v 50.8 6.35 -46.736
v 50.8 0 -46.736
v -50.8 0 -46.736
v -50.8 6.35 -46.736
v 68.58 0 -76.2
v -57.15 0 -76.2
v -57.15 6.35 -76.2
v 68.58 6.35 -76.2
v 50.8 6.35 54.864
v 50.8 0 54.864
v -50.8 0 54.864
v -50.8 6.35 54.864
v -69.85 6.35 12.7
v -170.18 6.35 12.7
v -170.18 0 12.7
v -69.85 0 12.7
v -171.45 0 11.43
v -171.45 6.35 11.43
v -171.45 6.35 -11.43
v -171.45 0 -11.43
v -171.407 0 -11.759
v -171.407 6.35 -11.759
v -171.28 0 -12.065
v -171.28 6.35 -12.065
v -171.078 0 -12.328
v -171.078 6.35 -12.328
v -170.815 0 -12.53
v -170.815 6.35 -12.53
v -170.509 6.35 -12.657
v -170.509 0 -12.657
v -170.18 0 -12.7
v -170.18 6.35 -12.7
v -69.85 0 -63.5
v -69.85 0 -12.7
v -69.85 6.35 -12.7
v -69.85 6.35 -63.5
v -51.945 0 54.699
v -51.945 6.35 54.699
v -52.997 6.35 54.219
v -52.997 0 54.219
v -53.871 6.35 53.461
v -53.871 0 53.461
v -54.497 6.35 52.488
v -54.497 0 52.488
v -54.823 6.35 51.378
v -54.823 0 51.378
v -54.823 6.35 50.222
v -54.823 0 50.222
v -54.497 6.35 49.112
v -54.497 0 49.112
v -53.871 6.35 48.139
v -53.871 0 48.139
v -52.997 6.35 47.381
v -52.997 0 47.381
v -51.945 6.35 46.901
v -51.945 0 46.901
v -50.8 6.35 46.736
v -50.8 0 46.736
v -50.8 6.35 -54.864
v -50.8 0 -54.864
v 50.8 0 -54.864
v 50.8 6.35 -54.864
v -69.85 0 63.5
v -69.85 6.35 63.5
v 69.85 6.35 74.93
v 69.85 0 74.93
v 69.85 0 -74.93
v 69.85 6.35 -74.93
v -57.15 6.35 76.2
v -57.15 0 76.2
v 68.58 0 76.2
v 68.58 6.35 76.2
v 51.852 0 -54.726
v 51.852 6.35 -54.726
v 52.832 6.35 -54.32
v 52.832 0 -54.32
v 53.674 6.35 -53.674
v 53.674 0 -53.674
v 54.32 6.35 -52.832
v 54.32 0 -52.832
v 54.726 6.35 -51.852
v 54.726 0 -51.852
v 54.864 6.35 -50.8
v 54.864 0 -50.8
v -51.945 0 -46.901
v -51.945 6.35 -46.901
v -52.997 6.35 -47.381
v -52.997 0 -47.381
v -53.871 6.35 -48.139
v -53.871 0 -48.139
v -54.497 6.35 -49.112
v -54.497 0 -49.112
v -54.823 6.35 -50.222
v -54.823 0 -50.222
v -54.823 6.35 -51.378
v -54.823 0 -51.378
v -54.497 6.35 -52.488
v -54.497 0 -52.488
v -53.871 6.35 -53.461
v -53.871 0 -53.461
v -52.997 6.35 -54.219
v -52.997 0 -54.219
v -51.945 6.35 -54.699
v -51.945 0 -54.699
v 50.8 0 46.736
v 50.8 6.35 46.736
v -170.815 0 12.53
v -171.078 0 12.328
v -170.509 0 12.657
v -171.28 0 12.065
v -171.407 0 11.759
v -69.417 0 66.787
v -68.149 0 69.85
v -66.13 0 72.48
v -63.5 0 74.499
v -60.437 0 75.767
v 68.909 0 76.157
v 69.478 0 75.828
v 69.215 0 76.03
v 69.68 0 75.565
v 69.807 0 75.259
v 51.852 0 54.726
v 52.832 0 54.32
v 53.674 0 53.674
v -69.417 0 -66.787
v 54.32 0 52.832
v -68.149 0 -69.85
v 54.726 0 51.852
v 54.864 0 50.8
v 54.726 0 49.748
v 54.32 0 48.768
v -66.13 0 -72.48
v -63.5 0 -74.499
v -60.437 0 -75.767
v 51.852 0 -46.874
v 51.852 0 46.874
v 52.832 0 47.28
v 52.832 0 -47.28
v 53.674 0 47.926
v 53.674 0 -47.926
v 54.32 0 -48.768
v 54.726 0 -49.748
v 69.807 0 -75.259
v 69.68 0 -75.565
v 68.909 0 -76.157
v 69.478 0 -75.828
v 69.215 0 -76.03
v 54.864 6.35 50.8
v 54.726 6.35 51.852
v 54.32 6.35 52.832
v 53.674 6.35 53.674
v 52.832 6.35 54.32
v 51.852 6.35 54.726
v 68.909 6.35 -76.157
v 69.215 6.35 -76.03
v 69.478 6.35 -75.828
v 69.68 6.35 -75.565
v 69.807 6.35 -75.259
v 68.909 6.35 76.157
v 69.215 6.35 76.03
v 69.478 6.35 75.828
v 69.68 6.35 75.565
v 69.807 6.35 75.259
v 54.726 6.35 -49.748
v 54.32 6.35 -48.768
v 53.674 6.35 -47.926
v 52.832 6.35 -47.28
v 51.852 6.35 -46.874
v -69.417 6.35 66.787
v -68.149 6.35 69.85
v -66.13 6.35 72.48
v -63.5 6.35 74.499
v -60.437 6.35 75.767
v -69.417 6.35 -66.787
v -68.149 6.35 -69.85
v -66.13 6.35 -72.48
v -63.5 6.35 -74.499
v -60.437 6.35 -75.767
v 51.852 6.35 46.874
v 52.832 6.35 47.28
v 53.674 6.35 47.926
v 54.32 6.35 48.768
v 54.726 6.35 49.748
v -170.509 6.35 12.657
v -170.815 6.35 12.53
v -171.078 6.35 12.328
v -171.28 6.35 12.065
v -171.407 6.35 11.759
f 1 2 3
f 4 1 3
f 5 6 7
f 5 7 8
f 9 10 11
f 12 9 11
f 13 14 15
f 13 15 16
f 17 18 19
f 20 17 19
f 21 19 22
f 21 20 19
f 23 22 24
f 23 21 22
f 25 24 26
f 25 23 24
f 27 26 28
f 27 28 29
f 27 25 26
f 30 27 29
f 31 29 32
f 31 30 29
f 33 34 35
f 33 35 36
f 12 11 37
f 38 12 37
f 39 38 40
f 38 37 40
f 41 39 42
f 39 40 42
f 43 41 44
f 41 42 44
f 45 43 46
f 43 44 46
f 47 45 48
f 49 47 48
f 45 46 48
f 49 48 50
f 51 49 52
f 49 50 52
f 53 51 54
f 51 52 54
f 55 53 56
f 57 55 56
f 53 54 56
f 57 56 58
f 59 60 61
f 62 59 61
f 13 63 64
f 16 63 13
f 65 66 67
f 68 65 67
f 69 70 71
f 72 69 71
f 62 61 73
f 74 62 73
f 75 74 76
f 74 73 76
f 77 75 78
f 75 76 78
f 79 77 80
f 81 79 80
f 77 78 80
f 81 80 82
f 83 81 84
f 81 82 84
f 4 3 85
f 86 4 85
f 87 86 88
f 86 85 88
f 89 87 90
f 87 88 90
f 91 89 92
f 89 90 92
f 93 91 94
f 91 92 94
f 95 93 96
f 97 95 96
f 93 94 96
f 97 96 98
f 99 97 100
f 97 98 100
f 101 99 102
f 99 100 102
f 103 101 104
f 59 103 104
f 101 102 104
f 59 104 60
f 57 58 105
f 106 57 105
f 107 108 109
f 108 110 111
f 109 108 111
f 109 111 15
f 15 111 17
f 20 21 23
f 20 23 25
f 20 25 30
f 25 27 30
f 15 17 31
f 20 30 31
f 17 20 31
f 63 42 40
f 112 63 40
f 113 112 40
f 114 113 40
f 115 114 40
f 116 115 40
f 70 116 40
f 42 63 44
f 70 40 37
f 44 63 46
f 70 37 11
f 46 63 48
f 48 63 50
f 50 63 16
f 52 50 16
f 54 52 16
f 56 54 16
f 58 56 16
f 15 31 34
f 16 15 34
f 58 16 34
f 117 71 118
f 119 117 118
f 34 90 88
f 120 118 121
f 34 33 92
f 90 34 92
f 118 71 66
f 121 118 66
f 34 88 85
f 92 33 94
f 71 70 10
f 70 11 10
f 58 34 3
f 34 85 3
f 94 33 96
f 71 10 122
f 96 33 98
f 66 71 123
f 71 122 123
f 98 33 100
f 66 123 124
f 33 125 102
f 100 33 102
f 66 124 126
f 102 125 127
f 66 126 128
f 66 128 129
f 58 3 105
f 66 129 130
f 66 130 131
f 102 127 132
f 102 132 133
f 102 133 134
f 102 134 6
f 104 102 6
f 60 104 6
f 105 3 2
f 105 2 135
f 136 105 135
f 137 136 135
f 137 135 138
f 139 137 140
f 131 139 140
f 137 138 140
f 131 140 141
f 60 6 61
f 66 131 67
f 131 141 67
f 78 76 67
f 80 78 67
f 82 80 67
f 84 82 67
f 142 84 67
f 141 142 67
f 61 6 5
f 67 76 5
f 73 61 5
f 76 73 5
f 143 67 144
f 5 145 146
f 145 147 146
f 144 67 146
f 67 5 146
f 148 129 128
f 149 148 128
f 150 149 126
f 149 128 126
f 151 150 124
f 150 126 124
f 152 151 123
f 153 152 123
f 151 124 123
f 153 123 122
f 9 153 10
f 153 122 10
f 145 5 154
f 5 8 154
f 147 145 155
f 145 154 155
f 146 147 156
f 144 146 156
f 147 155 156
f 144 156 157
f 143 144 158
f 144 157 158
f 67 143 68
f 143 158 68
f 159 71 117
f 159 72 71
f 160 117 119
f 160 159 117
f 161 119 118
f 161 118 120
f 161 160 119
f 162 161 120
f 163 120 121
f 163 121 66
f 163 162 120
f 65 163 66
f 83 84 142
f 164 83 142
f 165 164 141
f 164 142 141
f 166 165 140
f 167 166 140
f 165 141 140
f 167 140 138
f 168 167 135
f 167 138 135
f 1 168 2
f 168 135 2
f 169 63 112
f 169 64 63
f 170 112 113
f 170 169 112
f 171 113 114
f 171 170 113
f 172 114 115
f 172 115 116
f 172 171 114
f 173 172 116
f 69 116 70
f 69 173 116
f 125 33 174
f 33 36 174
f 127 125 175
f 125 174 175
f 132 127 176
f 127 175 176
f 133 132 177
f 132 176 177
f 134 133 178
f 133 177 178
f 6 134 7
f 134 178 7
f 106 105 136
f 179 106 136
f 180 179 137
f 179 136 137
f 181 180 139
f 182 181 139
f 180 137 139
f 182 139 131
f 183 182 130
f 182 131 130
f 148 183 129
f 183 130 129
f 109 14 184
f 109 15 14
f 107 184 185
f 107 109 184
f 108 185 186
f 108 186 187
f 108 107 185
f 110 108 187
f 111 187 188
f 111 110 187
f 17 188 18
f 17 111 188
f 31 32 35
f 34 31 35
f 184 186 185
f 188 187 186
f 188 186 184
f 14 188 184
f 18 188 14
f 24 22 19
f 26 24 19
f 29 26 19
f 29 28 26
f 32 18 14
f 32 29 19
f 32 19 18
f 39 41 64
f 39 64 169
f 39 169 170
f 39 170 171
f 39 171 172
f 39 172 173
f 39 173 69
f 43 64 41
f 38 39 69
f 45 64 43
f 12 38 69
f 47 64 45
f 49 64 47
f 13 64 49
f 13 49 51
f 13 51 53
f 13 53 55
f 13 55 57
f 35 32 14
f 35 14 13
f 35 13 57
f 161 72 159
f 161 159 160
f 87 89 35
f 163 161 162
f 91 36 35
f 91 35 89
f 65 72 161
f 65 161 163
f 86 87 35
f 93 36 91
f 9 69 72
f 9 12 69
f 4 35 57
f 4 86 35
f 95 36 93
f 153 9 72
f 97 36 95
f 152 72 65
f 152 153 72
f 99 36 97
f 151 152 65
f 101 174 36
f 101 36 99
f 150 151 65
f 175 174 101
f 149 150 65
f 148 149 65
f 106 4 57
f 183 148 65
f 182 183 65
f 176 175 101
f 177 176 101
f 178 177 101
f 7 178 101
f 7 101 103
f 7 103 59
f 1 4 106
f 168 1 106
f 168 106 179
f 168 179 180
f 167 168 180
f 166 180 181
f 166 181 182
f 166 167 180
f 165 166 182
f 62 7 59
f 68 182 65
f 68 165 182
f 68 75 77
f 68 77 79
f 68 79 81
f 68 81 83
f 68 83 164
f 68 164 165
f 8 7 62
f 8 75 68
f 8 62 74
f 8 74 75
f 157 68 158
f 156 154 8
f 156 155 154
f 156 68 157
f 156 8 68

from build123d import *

# Parameters (mm, degrees)
SKETCH1_W           = 139.7
SKETCH1_H           = 152.4
BOSS_EXTRUDE1_DEPTH = 6.35
FILLET1_R           = 12.7
SKETCH2_W           = 101.6
SKETCH2_H           = 25.4
BOSS_EXTRUDE2_DEPTH = 6.35
FILLET2_R           = 1.27


with BuildPart() as part:
    # Sketch1 → Boss-Extrude1 (new body)
    with BuildSketch(Plane(origin=(0, 0, 0), x_dir=(1, 0, 0), z_dir=(0, 1, 0))):
        Rectangle(SKETCH1_W, SKETCH1_H)
        with BuildLine():
            ThreePointArc((54.864, -50.8), (53.673681959, -53.673681959), (50.8, -54.864))
            Line((50.8, -54.864), (-50.8, -54.864))
            ThreePointArc((-50.8, -54.864), (-54.864, -50.8), (-50.8, -46.736))
            Line((-50.8, -46.736), (50.8, -46.736))
            ThreePointArc((50.8, -46.736), (53.673681959, -47.926318041), (54.864, -50.8))
        make_face(mode=Mode.SUBTRACT)
        with BuildLine():
            ThreePointArc((-50.8, 46.736), (-54.864, 50.8), (-50.8, 54.864))
            Line((-50.8, 54.864), (50.8, 54.864))
            ThreePointArc((50.8, 54.864), (53.673681959, 53.673681959), (54.864, 50.8))
            ThreePointArc((54.864, 50.8), (53.673681959, 47.926318041), (50.8, 46.736))
            Line((50.8, 46.736), (-50.8, 46.736))
        make_face(mode=Mode.SUBTRACT)
    extrude(amount=BOSS_EXTRUDE1_DEPTH)

    # Fillet1
    fillet1_edges = [part.edges().sort_by_distance(p)[0] for p in [
        (-69.85, 3.175, 76.2),
        (-69.85, 3.175, -76.2),
    ]]
    fillet(fillet1_edges, radius=FILLET1_R)

    # Sketch2 → Boss-Extrude2 (add)
    with BuildSketch(Plane(origin=(0, 6.35, 0), x_dir=(1, 0, 0), z_dir=(0, 1, 0))):
        with Locations((-120.65, 0)):
            Rectangle(SKETCH2_W, SKETCH2_H)
    extrude(amount=-BOSS_EXTRUDE2_DEPTH)

    # Fillet2
    fillet2_edges = [part.edges().sort_by_distance(p)[0] for p in [
        (69.85, 3.175, -76.2),
        (69.85, 3.175, 76.2),
        (-171.45, 3.175, 12.7),
        (-171.45, 3.175, -12.7),
    ]]
    fillet(fillet2_edges, radius=FILLET2_R)


solid = part.part
